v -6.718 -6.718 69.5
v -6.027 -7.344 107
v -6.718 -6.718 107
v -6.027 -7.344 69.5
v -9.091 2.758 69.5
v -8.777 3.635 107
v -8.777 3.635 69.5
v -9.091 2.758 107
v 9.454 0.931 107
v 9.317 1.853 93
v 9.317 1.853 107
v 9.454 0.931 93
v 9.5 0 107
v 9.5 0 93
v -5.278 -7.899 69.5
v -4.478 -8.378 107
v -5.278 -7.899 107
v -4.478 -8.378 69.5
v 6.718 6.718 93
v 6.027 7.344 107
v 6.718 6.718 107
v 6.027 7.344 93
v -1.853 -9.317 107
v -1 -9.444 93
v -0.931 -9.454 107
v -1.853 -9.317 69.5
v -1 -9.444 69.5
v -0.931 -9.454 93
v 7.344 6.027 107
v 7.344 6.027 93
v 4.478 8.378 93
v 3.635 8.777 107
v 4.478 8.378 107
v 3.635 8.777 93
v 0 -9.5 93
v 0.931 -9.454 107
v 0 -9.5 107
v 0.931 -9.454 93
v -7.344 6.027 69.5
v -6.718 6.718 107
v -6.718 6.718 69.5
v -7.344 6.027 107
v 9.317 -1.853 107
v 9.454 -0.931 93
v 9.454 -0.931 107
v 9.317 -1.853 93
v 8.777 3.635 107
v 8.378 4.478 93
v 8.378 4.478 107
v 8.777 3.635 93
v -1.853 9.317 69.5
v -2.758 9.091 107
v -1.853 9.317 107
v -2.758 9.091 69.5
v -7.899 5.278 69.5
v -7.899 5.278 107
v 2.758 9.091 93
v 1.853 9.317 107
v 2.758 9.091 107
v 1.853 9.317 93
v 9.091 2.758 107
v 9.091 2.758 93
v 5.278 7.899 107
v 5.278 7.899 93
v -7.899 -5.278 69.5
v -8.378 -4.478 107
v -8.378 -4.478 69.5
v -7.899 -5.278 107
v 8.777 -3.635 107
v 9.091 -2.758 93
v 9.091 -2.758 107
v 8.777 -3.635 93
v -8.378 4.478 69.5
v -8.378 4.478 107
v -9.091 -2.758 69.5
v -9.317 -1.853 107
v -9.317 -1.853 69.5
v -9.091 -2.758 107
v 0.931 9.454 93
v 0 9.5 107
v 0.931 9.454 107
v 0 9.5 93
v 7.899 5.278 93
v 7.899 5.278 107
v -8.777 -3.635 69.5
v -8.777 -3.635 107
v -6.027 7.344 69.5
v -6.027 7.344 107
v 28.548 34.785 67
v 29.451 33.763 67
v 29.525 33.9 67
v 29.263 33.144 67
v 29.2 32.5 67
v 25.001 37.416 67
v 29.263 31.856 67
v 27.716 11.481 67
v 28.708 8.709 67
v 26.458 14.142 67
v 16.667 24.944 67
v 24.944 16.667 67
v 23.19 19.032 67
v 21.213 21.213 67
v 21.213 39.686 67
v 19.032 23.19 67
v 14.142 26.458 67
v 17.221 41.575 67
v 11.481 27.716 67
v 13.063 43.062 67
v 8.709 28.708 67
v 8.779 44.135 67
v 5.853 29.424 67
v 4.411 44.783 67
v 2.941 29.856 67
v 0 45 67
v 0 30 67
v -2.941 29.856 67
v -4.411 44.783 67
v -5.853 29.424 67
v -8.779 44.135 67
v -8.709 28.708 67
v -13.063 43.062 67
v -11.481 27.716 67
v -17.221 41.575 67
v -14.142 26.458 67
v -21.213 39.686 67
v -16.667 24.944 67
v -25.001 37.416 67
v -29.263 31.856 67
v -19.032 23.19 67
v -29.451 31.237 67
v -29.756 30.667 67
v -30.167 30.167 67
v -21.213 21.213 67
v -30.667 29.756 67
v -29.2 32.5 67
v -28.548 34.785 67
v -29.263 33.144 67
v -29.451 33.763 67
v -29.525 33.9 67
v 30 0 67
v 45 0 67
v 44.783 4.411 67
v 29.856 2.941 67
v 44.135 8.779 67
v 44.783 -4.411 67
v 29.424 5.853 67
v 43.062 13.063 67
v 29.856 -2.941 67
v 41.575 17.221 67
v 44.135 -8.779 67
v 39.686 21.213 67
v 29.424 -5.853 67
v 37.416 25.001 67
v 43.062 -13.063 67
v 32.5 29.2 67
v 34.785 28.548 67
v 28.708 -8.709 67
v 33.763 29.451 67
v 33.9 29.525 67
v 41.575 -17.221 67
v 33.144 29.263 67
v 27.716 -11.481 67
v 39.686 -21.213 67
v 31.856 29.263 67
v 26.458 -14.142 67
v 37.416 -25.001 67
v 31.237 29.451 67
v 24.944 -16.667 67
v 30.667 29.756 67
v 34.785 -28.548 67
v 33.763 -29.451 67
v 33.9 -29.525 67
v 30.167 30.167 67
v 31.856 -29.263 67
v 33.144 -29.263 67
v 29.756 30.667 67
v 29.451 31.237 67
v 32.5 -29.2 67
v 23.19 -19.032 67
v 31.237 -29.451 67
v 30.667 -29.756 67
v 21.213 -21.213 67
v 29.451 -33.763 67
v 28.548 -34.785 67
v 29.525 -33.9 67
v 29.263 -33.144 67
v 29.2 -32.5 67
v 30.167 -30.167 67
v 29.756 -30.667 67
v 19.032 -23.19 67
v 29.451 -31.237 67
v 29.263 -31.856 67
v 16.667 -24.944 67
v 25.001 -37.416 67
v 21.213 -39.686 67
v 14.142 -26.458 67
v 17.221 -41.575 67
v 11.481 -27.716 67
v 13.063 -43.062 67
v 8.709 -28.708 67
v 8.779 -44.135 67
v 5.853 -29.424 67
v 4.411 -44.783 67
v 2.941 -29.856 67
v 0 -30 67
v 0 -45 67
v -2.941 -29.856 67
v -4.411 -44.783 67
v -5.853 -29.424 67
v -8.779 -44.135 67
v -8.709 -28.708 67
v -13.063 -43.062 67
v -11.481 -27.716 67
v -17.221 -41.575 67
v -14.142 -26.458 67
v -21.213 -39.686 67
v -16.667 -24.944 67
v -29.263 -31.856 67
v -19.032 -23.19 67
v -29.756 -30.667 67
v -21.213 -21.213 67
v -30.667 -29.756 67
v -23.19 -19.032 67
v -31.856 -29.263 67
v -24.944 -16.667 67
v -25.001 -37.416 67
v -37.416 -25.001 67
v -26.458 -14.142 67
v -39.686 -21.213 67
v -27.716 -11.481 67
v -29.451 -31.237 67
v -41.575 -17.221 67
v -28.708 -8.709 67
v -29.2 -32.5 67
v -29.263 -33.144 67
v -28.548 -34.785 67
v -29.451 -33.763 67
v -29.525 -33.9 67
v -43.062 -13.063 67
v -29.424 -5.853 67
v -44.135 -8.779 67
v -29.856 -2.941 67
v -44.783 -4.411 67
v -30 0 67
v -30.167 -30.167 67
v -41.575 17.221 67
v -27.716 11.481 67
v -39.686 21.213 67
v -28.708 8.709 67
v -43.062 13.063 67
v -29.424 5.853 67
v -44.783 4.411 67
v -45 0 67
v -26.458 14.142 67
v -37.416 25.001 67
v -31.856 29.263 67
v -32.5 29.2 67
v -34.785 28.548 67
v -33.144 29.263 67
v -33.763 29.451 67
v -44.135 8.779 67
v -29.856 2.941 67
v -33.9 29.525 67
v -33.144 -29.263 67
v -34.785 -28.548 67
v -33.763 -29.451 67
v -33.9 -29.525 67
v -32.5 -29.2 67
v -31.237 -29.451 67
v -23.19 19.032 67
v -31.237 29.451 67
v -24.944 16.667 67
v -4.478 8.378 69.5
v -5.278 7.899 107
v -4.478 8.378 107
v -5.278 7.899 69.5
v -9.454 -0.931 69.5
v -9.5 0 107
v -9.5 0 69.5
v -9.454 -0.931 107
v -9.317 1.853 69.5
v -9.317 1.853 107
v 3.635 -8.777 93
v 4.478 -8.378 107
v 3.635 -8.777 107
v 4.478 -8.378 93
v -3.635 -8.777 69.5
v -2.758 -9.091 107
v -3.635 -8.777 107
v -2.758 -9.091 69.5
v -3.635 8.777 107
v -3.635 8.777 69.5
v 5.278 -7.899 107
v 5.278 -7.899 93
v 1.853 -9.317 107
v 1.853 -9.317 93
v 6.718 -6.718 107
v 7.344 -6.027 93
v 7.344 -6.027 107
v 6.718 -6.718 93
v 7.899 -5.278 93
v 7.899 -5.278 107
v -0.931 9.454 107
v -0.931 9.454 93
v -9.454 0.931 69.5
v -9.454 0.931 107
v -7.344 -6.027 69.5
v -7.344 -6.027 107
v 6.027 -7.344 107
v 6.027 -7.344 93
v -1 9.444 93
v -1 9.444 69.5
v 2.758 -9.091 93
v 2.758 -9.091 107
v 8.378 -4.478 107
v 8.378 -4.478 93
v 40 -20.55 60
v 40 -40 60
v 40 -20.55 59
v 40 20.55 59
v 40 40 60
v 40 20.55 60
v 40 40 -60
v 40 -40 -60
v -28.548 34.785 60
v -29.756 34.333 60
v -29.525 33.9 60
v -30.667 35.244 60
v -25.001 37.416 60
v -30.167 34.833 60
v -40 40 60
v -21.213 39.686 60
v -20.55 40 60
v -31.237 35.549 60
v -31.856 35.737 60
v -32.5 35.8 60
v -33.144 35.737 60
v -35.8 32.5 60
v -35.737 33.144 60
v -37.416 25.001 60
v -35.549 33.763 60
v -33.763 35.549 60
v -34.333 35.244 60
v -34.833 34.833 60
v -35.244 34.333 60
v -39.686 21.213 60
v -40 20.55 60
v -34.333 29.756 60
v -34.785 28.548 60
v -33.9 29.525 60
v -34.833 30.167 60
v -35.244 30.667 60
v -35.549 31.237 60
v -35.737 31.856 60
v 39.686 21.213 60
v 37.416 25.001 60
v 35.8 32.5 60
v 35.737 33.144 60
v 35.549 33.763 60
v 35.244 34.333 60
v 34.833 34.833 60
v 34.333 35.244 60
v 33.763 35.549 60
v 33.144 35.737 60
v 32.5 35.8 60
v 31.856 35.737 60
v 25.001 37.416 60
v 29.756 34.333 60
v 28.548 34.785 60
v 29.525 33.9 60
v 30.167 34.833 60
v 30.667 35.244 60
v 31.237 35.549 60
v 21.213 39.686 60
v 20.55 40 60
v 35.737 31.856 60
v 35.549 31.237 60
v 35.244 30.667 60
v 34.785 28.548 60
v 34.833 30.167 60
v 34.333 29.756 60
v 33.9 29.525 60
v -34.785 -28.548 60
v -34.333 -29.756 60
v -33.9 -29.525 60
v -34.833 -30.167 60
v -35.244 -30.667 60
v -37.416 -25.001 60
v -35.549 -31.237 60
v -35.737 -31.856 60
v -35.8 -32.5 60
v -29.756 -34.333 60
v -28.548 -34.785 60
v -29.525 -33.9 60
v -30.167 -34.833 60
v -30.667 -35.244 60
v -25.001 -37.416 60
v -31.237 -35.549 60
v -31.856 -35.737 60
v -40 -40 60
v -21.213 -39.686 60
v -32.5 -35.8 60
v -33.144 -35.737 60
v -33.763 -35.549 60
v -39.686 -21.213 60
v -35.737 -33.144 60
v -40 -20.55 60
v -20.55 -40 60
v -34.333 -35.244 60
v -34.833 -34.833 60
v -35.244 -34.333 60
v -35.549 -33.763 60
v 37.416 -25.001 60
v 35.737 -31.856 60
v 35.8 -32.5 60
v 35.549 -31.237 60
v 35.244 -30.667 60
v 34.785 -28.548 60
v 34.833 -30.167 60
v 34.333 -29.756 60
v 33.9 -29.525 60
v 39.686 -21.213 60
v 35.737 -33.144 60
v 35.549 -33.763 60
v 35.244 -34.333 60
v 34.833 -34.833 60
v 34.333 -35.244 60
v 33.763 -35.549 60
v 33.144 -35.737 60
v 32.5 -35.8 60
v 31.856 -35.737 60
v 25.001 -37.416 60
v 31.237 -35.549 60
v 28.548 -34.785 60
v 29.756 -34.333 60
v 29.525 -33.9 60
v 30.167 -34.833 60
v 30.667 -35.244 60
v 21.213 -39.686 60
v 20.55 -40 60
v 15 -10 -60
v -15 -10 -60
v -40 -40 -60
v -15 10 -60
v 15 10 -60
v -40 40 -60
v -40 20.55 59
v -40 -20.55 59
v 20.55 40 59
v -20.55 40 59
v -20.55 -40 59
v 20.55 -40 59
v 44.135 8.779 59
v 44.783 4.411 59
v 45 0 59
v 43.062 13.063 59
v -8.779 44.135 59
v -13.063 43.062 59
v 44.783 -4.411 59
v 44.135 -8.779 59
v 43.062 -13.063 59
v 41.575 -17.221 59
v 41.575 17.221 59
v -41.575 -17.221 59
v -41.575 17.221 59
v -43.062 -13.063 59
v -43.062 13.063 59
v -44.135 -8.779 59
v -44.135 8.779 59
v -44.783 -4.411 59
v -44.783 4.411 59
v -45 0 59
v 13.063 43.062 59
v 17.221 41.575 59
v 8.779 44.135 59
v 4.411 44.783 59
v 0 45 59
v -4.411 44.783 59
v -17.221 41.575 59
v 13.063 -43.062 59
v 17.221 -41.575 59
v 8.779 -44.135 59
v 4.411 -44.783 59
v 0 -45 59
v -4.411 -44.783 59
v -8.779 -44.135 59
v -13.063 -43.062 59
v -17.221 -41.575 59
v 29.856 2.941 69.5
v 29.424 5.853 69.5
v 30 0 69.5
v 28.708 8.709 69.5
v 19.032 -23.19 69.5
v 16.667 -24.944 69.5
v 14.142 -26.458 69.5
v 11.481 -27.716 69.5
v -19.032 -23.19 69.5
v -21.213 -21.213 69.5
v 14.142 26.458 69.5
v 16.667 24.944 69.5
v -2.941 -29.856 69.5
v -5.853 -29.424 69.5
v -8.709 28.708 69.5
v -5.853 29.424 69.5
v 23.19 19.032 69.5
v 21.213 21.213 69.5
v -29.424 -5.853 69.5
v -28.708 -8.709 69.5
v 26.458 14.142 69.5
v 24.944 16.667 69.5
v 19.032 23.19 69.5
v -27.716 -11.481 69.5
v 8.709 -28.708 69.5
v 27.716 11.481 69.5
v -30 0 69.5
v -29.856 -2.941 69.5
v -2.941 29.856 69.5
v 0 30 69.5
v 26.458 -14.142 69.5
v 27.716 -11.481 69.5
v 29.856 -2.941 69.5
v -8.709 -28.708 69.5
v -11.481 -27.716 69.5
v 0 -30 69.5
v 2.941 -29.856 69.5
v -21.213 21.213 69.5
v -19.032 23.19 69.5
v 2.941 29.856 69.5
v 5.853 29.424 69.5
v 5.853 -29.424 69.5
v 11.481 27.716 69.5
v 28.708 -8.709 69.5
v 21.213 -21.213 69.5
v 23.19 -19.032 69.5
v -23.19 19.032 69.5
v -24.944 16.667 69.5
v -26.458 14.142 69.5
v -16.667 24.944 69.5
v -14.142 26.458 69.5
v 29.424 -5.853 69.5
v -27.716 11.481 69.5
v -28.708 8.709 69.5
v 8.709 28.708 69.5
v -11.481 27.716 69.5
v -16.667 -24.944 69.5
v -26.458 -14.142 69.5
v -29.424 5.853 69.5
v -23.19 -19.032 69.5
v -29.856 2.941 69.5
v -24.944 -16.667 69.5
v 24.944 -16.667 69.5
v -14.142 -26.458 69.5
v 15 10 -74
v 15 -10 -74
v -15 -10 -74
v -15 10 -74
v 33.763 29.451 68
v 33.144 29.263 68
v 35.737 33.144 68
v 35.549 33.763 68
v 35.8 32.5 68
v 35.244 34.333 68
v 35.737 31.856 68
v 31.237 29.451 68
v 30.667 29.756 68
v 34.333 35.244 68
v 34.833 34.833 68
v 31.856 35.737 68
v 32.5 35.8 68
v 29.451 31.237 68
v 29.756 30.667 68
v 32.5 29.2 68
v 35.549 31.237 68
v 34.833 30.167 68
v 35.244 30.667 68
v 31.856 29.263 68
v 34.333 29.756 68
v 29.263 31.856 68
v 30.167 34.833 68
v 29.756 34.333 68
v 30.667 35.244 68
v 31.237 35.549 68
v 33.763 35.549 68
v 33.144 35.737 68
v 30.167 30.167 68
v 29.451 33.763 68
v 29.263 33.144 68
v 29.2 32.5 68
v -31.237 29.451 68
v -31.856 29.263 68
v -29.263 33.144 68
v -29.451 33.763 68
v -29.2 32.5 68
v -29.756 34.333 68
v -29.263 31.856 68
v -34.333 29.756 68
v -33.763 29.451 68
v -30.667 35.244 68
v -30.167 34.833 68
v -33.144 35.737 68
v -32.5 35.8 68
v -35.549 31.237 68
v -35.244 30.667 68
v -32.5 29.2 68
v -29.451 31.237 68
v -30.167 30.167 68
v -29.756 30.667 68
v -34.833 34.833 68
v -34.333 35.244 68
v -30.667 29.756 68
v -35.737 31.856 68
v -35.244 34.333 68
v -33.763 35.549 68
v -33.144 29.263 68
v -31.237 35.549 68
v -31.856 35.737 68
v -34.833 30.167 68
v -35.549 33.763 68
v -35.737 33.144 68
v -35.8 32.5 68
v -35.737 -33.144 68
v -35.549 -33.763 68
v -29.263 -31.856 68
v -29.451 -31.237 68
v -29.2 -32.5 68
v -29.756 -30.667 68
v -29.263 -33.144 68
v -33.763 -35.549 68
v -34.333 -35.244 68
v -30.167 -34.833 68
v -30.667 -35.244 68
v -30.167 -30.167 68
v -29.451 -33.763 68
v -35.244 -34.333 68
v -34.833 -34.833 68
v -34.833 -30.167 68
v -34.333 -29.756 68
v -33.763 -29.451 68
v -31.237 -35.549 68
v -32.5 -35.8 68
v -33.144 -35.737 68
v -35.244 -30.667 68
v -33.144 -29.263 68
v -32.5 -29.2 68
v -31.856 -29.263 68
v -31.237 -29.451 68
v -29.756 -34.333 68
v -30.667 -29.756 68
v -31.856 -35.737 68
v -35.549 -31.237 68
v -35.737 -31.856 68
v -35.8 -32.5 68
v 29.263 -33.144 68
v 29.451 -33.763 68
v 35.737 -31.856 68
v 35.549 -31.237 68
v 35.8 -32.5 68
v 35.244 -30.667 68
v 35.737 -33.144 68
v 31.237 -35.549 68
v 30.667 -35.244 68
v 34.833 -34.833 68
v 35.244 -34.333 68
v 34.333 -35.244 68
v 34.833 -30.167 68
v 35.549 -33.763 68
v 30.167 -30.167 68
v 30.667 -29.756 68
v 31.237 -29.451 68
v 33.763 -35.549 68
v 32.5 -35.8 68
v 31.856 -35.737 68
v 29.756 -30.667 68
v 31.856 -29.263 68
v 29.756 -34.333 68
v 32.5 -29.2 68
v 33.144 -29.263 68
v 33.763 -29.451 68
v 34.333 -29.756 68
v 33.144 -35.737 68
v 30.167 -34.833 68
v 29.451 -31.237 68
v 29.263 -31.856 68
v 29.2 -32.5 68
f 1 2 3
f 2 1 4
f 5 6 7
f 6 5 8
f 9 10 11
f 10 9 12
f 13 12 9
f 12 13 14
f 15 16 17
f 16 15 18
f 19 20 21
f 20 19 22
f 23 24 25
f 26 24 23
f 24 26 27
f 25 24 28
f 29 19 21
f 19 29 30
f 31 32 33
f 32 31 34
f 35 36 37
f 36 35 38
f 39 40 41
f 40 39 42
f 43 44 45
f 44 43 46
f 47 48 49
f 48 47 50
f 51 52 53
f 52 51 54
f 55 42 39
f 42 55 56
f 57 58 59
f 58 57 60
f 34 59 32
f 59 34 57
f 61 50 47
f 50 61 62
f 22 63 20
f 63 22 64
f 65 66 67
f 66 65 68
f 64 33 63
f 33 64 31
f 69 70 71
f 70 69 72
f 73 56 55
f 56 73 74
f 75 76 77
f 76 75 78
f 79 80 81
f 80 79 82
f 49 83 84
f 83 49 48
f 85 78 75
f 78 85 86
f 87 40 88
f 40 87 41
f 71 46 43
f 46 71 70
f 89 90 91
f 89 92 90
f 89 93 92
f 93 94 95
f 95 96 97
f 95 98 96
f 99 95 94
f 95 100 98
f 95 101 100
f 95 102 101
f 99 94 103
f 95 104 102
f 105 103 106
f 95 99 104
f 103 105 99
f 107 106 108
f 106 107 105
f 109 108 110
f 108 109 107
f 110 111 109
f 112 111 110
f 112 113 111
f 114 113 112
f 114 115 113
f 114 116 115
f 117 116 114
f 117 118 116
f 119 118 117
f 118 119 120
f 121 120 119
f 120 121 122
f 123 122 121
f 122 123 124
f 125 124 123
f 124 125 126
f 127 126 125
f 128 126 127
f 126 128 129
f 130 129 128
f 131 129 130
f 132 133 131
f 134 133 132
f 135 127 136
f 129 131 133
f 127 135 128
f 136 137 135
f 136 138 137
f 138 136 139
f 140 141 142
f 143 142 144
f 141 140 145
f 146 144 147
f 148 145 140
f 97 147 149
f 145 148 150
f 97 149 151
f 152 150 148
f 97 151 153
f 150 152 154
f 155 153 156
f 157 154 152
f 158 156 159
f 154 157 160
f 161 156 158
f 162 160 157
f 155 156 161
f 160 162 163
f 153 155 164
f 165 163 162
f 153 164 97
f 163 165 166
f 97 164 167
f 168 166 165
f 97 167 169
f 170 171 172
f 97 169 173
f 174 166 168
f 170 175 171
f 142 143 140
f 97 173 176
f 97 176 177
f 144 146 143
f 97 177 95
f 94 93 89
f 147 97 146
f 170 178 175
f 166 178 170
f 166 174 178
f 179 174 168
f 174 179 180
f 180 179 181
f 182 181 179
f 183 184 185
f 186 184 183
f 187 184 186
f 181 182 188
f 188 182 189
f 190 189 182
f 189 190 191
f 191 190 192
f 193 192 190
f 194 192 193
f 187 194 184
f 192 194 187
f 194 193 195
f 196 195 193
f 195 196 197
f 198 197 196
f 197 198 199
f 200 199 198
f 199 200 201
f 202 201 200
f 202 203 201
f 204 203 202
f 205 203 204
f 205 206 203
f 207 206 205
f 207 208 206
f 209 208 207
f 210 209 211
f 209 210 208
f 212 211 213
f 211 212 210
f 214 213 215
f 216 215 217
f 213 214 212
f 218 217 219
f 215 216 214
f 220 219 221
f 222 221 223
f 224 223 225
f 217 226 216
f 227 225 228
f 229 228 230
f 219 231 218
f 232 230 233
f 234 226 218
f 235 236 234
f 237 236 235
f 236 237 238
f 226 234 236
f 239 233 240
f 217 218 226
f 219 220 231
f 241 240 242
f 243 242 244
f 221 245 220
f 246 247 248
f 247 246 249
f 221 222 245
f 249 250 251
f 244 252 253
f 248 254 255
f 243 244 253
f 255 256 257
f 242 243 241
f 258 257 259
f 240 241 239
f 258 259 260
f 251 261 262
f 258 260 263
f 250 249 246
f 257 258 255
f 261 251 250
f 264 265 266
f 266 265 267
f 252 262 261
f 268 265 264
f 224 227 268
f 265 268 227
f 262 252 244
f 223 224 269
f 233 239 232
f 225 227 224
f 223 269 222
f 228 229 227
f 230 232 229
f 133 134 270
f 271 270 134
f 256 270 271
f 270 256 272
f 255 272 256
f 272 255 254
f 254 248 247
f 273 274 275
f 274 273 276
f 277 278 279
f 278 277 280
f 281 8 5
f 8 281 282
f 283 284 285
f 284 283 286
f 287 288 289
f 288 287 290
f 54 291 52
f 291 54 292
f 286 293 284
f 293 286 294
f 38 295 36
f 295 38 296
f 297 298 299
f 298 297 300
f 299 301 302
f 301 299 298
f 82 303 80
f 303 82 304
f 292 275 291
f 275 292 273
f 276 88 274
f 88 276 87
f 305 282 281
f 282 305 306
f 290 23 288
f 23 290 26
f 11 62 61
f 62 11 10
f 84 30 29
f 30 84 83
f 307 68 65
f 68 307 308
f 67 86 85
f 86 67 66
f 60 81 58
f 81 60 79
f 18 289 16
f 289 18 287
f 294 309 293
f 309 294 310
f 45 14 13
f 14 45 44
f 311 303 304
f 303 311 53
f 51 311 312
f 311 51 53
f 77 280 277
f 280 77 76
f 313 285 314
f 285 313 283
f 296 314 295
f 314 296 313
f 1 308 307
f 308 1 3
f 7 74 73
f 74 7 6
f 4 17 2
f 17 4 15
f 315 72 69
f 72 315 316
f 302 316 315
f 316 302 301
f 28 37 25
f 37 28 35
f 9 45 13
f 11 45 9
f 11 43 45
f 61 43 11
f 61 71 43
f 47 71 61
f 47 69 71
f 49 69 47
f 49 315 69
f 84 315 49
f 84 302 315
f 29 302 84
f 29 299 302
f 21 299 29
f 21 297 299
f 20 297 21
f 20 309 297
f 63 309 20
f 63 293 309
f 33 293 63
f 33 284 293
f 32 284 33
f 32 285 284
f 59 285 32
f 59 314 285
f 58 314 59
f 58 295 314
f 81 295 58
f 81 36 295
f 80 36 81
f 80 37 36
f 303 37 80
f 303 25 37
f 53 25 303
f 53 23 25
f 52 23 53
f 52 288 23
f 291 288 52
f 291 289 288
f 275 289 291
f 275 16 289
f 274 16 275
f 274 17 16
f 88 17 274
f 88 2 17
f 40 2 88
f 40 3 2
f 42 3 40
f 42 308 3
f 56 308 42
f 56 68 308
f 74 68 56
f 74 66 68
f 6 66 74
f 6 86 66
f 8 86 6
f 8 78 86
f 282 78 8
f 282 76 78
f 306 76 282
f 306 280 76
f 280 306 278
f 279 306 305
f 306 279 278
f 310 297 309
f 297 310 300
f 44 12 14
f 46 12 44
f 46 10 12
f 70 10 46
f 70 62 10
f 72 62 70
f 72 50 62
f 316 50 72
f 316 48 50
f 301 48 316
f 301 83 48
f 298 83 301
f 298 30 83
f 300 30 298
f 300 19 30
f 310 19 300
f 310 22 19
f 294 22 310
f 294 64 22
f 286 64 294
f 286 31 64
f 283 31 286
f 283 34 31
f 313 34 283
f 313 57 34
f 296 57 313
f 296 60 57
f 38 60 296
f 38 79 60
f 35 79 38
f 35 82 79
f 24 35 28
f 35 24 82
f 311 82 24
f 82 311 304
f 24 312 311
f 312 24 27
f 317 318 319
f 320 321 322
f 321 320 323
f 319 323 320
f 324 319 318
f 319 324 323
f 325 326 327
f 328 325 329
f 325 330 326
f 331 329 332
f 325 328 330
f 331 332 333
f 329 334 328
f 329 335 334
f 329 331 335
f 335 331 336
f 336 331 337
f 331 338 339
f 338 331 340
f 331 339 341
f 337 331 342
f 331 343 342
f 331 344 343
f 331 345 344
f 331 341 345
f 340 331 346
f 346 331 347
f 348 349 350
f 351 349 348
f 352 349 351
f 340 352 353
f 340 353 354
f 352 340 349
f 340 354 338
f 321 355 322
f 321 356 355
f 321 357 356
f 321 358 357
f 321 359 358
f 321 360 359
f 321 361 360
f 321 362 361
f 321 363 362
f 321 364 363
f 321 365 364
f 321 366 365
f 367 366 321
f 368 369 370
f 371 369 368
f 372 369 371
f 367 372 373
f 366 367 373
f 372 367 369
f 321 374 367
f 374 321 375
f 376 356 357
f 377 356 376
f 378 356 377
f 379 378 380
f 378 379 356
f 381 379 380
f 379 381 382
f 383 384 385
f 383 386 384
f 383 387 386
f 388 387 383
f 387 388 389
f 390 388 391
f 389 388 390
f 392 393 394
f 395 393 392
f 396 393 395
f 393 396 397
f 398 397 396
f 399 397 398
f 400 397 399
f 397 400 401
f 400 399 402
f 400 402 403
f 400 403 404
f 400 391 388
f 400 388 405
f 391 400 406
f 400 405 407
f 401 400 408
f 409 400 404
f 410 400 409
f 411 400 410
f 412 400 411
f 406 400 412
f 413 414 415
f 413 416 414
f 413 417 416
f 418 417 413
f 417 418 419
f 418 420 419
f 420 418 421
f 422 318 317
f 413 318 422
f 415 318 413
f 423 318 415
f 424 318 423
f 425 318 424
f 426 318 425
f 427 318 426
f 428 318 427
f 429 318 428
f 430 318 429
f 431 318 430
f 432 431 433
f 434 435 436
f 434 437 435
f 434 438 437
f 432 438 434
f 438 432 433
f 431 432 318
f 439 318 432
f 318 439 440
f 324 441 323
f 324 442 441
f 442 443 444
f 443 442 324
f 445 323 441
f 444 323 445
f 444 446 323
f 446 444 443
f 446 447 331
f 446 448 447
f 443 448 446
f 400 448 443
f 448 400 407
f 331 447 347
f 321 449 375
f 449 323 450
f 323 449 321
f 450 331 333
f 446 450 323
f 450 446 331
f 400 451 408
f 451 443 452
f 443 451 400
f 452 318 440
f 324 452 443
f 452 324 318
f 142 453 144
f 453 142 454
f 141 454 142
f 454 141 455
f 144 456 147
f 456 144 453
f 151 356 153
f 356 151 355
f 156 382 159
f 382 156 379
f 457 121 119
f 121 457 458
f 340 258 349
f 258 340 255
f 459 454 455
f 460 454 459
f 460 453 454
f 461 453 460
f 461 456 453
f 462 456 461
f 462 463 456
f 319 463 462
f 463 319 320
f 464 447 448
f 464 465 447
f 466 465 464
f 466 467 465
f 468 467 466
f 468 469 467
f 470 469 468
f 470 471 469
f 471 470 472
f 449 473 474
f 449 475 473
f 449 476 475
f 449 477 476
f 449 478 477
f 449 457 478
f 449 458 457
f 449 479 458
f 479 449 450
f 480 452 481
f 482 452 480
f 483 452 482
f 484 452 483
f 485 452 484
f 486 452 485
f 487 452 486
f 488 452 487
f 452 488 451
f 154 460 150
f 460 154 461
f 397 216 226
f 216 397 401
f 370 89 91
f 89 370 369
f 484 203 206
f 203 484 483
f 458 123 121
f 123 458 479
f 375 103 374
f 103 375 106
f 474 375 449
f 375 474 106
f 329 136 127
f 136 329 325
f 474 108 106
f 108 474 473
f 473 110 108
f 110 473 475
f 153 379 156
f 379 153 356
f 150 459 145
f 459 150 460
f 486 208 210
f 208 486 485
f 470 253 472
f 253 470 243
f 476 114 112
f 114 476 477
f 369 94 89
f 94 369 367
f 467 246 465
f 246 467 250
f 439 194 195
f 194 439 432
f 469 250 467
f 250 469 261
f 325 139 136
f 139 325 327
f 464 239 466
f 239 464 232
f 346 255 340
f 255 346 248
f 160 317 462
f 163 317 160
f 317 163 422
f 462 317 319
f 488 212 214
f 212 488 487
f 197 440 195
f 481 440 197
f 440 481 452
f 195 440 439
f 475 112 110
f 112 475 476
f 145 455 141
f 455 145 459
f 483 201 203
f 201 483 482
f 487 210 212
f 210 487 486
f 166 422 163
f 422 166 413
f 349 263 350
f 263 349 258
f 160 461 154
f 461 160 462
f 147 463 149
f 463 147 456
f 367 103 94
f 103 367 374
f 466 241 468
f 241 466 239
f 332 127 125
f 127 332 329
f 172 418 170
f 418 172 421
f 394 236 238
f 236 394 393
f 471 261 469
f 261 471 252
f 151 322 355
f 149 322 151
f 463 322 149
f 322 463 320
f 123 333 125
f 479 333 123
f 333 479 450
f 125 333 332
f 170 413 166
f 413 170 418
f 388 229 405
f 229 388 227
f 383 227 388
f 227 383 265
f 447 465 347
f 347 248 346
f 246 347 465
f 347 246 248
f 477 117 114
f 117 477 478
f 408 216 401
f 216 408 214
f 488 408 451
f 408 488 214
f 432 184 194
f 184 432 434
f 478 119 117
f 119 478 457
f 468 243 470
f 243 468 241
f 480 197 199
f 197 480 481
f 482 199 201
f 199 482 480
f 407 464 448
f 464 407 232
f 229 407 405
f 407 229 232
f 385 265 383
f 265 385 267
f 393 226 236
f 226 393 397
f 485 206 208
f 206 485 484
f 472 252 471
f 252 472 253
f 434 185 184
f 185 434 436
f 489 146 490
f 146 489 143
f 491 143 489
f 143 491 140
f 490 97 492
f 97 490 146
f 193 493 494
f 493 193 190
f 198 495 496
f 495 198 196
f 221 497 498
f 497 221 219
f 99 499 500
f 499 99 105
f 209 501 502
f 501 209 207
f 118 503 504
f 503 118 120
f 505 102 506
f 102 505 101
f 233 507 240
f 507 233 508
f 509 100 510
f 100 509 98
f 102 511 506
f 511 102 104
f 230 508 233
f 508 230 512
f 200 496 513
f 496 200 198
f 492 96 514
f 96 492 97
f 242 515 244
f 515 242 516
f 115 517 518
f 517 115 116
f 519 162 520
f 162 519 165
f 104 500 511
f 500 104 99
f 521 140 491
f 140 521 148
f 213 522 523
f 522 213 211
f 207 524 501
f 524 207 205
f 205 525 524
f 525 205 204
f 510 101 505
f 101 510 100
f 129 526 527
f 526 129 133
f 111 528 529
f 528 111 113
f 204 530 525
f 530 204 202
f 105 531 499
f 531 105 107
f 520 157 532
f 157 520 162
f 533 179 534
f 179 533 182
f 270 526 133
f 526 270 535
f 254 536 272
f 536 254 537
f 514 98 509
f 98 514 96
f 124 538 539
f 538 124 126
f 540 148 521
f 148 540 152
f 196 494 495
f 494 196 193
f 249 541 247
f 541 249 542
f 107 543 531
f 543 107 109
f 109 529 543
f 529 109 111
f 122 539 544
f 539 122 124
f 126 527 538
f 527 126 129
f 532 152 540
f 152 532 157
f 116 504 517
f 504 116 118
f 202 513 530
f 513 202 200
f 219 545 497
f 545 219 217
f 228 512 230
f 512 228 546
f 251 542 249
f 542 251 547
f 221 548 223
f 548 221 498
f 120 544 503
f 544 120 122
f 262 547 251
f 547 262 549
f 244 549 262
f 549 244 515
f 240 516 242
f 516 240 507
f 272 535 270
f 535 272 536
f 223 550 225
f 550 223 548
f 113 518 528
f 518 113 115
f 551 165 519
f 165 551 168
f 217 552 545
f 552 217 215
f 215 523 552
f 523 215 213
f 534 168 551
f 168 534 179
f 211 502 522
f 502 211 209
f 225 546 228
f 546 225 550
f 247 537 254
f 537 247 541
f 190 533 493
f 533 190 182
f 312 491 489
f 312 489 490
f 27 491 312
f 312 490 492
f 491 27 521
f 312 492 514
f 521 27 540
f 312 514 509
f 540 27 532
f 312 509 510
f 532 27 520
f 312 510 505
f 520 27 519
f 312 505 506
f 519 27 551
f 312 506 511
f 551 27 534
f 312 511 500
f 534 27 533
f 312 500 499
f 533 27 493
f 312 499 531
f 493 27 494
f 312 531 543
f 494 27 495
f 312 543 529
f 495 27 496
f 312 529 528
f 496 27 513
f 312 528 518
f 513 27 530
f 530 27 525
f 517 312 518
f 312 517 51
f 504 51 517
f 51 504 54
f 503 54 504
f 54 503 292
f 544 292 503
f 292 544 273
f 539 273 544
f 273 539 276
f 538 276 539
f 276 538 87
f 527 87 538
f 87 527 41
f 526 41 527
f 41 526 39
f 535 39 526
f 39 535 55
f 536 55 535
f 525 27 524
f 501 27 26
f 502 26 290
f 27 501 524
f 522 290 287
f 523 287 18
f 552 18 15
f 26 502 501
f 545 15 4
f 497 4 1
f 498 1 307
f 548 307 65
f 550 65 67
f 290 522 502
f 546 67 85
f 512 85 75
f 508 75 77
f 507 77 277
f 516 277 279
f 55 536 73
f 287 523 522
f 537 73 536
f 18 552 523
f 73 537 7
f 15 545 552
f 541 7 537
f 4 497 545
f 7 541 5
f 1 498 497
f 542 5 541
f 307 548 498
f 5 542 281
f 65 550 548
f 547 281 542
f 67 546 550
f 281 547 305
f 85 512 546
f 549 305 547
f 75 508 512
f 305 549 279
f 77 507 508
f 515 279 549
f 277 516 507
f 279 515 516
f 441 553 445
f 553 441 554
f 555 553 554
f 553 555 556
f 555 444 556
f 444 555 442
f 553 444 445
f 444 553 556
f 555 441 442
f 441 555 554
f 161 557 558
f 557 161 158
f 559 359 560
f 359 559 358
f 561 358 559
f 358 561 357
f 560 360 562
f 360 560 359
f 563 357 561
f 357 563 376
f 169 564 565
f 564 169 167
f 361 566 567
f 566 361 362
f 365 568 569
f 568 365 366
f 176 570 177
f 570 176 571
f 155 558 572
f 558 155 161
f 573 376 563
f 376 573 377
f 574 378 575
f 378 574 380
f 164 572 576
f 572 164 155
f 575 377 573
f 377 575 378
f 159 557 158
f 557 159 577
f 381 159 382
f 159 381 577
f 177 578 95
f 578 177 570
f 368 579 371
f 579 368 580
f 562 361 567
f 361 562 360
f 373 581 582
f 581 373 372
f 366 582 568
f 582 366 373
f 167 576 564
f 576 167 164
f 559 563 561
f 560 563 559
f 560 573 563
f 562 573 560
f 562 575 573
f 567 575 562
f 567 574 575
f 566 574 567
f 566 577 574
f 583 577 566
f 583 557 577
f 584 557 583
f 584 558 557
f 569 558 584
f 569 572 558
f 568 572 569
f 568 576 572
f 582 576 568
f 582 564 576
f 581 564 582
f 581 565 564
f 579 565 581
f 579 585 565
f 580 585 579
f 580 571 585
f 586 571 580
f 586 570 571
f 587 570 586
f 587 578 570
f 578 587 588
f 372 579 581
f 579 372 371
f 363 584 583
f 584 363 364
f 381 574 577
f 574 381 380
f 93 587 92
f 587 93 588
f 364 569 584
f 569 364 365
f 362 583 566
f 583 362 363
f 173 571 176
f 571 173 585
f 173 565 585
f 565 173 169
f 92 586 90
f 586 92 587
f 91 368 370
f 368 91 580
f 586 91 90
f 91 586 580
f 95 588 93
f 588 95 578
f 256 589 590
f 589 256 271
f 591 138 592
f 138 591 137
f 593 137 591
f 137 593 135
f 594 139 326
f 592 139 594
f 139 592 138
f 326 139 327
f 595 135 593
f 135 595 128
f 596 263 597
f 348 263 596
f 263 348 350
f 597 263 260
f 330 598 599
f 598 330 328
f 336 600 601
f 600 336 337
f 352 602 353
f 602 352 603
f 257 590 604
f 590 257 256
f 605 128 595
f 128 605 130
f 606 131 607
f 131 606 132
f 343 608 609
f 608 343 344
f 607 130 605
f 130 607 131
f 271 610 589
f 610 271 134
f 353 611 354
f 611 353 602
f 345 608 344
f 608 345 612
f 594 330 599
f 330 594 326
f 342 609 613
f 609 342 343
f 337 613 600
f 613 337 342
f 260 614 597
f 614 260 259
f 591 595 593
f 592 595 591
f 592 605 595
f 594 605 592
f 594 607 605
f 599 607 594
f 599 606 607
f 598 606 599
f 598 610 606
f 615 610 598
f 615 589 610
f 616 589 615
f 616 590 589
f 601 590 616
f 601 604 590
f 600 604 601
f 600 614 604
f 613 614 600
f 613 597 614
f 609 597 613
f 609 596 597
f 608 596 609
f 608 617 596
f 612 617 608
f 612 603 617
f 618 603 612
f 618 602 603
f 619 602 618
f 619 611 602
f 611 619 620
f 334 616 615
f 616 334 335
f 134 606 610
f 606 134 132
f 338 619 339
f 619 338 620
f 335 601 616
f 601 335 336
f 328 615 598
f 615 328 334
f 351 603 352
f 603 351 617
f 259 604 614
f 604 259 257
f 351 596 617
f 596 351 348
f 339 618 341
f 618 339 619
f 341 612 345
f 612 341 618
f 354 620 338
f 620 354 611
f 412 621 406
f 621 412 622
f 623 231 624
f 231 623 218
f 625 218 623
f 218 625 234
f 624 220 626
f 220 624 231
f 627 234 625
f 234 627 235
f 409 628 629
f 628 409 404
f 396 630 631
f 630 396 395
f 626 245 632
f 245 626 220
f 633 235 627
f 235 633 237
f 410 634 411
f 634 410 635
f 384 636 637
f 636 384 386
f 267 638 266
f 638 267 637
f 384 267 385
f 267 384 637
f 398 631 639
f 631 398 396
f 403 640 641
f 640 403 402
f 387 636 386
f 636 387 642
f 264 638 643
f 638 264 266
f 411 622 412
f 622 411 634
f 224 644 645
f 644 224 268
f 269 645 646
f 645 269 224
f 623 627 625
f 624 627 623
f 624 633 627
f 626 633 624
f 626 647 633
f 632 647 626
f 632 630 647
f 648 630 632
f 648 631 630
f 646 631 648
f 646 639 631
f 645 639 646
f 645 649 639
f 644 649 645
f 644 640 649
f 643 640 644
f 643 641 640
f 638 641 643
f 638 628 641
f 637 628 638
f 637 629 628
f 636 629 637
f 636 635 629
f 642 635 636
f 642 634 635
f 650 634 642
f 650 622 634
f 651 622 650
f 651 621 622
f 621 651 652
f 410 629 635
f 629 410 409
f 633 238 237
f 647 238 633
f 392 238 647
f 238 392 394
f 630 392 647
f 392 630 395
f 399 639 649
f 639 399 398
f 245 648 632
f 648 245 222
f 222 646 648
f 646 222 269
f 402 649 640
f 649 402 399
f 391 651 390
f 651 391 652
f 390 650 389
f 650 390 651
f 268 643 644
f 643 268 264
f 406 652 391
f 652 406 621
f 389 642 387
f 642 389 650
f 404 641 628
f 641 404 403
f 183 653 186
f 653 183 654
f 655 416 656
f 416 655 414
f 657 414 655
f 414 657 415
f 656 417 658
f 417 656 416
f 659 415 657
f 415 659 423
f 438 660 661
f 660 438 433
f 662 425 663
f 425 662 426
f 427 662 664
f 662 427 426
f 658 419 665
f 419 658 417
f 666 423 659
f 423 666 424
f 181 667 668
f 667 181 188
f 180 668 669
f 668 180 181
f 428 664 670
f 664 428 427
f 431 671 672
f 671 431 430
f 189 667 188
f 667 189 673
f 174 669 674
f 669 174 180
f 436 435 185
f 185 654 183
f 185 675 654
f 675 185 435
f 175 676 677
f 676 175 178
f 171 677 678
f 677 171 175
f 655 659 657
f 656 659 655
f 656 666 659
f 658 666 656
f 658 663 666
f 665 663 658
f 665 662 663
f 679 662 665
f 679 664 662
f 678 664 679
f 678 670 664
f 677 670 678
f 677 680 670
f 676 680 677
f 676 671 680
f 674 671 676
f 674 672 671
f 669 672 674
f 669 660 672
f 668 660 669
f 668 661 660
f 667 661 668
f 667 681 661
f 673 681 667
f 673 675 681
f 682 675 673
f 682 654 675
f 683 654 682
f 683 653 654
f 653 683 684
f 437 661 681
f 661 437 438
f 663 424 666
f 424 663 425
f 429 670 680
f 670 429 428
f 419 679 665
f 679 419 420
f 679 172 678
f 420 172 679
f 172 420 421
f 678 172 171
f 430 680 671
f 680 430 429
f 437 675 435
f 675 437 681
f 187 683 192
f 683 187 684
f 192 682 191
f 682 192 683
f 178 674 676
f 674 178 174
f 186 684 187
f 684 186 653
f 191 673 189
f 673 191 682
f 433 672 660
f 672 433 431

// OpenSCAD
// Parameters
motor_frame_size_mm = 80; //[40:160:1]
body_length_mm = 120; //[60:240:1]
body_width_mm = 80; //[40:160:1]
body_height_mm = 80; //[40:160:1]
flange_thickness_mm = 8; //[4:16:1]
flange_outer_diameter_mm = 90; //[45:180:1]
pilot_diameter_mm = 60; //[30:120:1]
pilot_height_mm = 2.5; //[1:8:0.5]
shaft_diameter_mm = 19; //[9.5:38:0.5]
shaft_length_mm = 40; //[20:80:1]
mount_hole_count = 4; //[4:4:1]
mount_hole_diameter_mm = 6.6; //[3.3:13.2:0.1]
mount_hole_square_pitch_mm = 65; //[32.5:130:0.5]
rear_connector_boss_width_mm = 30; //[15:60:1]
rear_connector_boss_height_mm = 20; //[10:40:1]
rear_connector_boss_depth_mm = 15; //[7.5:30:1]
fillet_radius_mm = 2; //[0:6:0.5]
overlap_mm = 1; //[0.5:2:0.1]
hole_depth_extra_mm = 2; //[1:6:0.5]
shaft_flat_depth_mm = 1.0; //[0.5:3.0:0.1]
shaft_flat_length_mm = 25; //[10:60:1]

// Servo Motor - complete geometry
module servo_motor() {
  color([0.15, 0.2, 0.35]) {
    // Body
    translate([0, 0, 0])
      cube([body_width_mm, body_height_mm, body_length_mm], center=true);
    
    // Front Flange Faceplate
    translate([0, 0, body_length_mm/2 + flange_thickness_mm/2 - overlap_mm])
      cylinder(r=flange_outer_diameter_mm/2, h=flange_thickness_mm, center=true, $fn=64);
    
    // Front Pilot
    translate([0, 0, body_length_mm/2 + flange_thickness_mm - overlap_mm + pilot_height_mm/2])
      cylinder(r=pilot_diameter_mm/2, h=pilot_height_mm, center=true, $fn=64);
    
    // Output Shaft with Flat
    difference() {
      translate([0, 0, body_length_mm/2 + flange_thickness_mm - overlap_mm + shaft_length_mm/2])
        cylinder(r=shaft_diameter_mm/2, h=shaft_length_mm, center=true, $fn=64);
      translate([shaft_diameter_mm/2 - shaft_flat_depth_mm, 0, body_length_mm/2 + flange_thickness_mm - overlap_mm + shaft_flat_length_mm/2])
        cube([shaft_diameter_mm, shaft_diameter_mm, shaft_flat_length_mm + hole_depth_extra_mm], center=true);
    }
    
    // Rear Connector Boss
    translate([0, 0, -body_length_mm/2 - rear_connector_boss_depth_mm/2 + overlap_mm])
      cube([rear_connector_boss_width_mm, rear_connector_boss_height_mm, rear_connector_boss_depth_mm], center=true);
  }
  
  // Mounting Holes
  color("Black") {
    translate([mount_hole_square_pitch_mm/2, mount_hole_square_pitch_mm/2, body_length_mm/2 + flange_thickness_mm/2 - overlap_mm])
      cylinder(r=mount_hole_diameter_mm/2, h=flange_thickness_mm + hole_depth_extra_mm, center=true, $fn=32);
    translate([-mount_hole_square_pitch_mm/2, mount_hole_square_pitch_mm/2, body_length_mm/2 + flange_thickness_mm/2 - overlap_mm])
      cylinder(r=mount_hole_diameter_mm/2, h=flange_thickness_mm + hole_depth_extra_mm, center=true, $fn=32);
    translate([-mount_hole_square_pitch_mm/2, -mount_hole_square_pitch_mm/2, body_length_mm/2 + flange_thickness_mm/2 - overlap_mm])
      cylinder(r=mount_hole_diameter_mm/2, h=flange_thickness_mm + hole_depth_extra_mm, center=true, $fn=32);
    translate([mount_hole_square_pitch_mm/2, -mount_hole_square_pitch_mm/2, body_length_mm/2 + flange_thickness_mm/2 - overlap_mm])
      cylinder(r=mount_hole_diameter_mm/2, h=flange_thickness_mm + hole_depth_extra_mm, center=true, $fn=32);
  }
}

// Assembly
module assembly() {
  servo_motor();
}

assembly();
